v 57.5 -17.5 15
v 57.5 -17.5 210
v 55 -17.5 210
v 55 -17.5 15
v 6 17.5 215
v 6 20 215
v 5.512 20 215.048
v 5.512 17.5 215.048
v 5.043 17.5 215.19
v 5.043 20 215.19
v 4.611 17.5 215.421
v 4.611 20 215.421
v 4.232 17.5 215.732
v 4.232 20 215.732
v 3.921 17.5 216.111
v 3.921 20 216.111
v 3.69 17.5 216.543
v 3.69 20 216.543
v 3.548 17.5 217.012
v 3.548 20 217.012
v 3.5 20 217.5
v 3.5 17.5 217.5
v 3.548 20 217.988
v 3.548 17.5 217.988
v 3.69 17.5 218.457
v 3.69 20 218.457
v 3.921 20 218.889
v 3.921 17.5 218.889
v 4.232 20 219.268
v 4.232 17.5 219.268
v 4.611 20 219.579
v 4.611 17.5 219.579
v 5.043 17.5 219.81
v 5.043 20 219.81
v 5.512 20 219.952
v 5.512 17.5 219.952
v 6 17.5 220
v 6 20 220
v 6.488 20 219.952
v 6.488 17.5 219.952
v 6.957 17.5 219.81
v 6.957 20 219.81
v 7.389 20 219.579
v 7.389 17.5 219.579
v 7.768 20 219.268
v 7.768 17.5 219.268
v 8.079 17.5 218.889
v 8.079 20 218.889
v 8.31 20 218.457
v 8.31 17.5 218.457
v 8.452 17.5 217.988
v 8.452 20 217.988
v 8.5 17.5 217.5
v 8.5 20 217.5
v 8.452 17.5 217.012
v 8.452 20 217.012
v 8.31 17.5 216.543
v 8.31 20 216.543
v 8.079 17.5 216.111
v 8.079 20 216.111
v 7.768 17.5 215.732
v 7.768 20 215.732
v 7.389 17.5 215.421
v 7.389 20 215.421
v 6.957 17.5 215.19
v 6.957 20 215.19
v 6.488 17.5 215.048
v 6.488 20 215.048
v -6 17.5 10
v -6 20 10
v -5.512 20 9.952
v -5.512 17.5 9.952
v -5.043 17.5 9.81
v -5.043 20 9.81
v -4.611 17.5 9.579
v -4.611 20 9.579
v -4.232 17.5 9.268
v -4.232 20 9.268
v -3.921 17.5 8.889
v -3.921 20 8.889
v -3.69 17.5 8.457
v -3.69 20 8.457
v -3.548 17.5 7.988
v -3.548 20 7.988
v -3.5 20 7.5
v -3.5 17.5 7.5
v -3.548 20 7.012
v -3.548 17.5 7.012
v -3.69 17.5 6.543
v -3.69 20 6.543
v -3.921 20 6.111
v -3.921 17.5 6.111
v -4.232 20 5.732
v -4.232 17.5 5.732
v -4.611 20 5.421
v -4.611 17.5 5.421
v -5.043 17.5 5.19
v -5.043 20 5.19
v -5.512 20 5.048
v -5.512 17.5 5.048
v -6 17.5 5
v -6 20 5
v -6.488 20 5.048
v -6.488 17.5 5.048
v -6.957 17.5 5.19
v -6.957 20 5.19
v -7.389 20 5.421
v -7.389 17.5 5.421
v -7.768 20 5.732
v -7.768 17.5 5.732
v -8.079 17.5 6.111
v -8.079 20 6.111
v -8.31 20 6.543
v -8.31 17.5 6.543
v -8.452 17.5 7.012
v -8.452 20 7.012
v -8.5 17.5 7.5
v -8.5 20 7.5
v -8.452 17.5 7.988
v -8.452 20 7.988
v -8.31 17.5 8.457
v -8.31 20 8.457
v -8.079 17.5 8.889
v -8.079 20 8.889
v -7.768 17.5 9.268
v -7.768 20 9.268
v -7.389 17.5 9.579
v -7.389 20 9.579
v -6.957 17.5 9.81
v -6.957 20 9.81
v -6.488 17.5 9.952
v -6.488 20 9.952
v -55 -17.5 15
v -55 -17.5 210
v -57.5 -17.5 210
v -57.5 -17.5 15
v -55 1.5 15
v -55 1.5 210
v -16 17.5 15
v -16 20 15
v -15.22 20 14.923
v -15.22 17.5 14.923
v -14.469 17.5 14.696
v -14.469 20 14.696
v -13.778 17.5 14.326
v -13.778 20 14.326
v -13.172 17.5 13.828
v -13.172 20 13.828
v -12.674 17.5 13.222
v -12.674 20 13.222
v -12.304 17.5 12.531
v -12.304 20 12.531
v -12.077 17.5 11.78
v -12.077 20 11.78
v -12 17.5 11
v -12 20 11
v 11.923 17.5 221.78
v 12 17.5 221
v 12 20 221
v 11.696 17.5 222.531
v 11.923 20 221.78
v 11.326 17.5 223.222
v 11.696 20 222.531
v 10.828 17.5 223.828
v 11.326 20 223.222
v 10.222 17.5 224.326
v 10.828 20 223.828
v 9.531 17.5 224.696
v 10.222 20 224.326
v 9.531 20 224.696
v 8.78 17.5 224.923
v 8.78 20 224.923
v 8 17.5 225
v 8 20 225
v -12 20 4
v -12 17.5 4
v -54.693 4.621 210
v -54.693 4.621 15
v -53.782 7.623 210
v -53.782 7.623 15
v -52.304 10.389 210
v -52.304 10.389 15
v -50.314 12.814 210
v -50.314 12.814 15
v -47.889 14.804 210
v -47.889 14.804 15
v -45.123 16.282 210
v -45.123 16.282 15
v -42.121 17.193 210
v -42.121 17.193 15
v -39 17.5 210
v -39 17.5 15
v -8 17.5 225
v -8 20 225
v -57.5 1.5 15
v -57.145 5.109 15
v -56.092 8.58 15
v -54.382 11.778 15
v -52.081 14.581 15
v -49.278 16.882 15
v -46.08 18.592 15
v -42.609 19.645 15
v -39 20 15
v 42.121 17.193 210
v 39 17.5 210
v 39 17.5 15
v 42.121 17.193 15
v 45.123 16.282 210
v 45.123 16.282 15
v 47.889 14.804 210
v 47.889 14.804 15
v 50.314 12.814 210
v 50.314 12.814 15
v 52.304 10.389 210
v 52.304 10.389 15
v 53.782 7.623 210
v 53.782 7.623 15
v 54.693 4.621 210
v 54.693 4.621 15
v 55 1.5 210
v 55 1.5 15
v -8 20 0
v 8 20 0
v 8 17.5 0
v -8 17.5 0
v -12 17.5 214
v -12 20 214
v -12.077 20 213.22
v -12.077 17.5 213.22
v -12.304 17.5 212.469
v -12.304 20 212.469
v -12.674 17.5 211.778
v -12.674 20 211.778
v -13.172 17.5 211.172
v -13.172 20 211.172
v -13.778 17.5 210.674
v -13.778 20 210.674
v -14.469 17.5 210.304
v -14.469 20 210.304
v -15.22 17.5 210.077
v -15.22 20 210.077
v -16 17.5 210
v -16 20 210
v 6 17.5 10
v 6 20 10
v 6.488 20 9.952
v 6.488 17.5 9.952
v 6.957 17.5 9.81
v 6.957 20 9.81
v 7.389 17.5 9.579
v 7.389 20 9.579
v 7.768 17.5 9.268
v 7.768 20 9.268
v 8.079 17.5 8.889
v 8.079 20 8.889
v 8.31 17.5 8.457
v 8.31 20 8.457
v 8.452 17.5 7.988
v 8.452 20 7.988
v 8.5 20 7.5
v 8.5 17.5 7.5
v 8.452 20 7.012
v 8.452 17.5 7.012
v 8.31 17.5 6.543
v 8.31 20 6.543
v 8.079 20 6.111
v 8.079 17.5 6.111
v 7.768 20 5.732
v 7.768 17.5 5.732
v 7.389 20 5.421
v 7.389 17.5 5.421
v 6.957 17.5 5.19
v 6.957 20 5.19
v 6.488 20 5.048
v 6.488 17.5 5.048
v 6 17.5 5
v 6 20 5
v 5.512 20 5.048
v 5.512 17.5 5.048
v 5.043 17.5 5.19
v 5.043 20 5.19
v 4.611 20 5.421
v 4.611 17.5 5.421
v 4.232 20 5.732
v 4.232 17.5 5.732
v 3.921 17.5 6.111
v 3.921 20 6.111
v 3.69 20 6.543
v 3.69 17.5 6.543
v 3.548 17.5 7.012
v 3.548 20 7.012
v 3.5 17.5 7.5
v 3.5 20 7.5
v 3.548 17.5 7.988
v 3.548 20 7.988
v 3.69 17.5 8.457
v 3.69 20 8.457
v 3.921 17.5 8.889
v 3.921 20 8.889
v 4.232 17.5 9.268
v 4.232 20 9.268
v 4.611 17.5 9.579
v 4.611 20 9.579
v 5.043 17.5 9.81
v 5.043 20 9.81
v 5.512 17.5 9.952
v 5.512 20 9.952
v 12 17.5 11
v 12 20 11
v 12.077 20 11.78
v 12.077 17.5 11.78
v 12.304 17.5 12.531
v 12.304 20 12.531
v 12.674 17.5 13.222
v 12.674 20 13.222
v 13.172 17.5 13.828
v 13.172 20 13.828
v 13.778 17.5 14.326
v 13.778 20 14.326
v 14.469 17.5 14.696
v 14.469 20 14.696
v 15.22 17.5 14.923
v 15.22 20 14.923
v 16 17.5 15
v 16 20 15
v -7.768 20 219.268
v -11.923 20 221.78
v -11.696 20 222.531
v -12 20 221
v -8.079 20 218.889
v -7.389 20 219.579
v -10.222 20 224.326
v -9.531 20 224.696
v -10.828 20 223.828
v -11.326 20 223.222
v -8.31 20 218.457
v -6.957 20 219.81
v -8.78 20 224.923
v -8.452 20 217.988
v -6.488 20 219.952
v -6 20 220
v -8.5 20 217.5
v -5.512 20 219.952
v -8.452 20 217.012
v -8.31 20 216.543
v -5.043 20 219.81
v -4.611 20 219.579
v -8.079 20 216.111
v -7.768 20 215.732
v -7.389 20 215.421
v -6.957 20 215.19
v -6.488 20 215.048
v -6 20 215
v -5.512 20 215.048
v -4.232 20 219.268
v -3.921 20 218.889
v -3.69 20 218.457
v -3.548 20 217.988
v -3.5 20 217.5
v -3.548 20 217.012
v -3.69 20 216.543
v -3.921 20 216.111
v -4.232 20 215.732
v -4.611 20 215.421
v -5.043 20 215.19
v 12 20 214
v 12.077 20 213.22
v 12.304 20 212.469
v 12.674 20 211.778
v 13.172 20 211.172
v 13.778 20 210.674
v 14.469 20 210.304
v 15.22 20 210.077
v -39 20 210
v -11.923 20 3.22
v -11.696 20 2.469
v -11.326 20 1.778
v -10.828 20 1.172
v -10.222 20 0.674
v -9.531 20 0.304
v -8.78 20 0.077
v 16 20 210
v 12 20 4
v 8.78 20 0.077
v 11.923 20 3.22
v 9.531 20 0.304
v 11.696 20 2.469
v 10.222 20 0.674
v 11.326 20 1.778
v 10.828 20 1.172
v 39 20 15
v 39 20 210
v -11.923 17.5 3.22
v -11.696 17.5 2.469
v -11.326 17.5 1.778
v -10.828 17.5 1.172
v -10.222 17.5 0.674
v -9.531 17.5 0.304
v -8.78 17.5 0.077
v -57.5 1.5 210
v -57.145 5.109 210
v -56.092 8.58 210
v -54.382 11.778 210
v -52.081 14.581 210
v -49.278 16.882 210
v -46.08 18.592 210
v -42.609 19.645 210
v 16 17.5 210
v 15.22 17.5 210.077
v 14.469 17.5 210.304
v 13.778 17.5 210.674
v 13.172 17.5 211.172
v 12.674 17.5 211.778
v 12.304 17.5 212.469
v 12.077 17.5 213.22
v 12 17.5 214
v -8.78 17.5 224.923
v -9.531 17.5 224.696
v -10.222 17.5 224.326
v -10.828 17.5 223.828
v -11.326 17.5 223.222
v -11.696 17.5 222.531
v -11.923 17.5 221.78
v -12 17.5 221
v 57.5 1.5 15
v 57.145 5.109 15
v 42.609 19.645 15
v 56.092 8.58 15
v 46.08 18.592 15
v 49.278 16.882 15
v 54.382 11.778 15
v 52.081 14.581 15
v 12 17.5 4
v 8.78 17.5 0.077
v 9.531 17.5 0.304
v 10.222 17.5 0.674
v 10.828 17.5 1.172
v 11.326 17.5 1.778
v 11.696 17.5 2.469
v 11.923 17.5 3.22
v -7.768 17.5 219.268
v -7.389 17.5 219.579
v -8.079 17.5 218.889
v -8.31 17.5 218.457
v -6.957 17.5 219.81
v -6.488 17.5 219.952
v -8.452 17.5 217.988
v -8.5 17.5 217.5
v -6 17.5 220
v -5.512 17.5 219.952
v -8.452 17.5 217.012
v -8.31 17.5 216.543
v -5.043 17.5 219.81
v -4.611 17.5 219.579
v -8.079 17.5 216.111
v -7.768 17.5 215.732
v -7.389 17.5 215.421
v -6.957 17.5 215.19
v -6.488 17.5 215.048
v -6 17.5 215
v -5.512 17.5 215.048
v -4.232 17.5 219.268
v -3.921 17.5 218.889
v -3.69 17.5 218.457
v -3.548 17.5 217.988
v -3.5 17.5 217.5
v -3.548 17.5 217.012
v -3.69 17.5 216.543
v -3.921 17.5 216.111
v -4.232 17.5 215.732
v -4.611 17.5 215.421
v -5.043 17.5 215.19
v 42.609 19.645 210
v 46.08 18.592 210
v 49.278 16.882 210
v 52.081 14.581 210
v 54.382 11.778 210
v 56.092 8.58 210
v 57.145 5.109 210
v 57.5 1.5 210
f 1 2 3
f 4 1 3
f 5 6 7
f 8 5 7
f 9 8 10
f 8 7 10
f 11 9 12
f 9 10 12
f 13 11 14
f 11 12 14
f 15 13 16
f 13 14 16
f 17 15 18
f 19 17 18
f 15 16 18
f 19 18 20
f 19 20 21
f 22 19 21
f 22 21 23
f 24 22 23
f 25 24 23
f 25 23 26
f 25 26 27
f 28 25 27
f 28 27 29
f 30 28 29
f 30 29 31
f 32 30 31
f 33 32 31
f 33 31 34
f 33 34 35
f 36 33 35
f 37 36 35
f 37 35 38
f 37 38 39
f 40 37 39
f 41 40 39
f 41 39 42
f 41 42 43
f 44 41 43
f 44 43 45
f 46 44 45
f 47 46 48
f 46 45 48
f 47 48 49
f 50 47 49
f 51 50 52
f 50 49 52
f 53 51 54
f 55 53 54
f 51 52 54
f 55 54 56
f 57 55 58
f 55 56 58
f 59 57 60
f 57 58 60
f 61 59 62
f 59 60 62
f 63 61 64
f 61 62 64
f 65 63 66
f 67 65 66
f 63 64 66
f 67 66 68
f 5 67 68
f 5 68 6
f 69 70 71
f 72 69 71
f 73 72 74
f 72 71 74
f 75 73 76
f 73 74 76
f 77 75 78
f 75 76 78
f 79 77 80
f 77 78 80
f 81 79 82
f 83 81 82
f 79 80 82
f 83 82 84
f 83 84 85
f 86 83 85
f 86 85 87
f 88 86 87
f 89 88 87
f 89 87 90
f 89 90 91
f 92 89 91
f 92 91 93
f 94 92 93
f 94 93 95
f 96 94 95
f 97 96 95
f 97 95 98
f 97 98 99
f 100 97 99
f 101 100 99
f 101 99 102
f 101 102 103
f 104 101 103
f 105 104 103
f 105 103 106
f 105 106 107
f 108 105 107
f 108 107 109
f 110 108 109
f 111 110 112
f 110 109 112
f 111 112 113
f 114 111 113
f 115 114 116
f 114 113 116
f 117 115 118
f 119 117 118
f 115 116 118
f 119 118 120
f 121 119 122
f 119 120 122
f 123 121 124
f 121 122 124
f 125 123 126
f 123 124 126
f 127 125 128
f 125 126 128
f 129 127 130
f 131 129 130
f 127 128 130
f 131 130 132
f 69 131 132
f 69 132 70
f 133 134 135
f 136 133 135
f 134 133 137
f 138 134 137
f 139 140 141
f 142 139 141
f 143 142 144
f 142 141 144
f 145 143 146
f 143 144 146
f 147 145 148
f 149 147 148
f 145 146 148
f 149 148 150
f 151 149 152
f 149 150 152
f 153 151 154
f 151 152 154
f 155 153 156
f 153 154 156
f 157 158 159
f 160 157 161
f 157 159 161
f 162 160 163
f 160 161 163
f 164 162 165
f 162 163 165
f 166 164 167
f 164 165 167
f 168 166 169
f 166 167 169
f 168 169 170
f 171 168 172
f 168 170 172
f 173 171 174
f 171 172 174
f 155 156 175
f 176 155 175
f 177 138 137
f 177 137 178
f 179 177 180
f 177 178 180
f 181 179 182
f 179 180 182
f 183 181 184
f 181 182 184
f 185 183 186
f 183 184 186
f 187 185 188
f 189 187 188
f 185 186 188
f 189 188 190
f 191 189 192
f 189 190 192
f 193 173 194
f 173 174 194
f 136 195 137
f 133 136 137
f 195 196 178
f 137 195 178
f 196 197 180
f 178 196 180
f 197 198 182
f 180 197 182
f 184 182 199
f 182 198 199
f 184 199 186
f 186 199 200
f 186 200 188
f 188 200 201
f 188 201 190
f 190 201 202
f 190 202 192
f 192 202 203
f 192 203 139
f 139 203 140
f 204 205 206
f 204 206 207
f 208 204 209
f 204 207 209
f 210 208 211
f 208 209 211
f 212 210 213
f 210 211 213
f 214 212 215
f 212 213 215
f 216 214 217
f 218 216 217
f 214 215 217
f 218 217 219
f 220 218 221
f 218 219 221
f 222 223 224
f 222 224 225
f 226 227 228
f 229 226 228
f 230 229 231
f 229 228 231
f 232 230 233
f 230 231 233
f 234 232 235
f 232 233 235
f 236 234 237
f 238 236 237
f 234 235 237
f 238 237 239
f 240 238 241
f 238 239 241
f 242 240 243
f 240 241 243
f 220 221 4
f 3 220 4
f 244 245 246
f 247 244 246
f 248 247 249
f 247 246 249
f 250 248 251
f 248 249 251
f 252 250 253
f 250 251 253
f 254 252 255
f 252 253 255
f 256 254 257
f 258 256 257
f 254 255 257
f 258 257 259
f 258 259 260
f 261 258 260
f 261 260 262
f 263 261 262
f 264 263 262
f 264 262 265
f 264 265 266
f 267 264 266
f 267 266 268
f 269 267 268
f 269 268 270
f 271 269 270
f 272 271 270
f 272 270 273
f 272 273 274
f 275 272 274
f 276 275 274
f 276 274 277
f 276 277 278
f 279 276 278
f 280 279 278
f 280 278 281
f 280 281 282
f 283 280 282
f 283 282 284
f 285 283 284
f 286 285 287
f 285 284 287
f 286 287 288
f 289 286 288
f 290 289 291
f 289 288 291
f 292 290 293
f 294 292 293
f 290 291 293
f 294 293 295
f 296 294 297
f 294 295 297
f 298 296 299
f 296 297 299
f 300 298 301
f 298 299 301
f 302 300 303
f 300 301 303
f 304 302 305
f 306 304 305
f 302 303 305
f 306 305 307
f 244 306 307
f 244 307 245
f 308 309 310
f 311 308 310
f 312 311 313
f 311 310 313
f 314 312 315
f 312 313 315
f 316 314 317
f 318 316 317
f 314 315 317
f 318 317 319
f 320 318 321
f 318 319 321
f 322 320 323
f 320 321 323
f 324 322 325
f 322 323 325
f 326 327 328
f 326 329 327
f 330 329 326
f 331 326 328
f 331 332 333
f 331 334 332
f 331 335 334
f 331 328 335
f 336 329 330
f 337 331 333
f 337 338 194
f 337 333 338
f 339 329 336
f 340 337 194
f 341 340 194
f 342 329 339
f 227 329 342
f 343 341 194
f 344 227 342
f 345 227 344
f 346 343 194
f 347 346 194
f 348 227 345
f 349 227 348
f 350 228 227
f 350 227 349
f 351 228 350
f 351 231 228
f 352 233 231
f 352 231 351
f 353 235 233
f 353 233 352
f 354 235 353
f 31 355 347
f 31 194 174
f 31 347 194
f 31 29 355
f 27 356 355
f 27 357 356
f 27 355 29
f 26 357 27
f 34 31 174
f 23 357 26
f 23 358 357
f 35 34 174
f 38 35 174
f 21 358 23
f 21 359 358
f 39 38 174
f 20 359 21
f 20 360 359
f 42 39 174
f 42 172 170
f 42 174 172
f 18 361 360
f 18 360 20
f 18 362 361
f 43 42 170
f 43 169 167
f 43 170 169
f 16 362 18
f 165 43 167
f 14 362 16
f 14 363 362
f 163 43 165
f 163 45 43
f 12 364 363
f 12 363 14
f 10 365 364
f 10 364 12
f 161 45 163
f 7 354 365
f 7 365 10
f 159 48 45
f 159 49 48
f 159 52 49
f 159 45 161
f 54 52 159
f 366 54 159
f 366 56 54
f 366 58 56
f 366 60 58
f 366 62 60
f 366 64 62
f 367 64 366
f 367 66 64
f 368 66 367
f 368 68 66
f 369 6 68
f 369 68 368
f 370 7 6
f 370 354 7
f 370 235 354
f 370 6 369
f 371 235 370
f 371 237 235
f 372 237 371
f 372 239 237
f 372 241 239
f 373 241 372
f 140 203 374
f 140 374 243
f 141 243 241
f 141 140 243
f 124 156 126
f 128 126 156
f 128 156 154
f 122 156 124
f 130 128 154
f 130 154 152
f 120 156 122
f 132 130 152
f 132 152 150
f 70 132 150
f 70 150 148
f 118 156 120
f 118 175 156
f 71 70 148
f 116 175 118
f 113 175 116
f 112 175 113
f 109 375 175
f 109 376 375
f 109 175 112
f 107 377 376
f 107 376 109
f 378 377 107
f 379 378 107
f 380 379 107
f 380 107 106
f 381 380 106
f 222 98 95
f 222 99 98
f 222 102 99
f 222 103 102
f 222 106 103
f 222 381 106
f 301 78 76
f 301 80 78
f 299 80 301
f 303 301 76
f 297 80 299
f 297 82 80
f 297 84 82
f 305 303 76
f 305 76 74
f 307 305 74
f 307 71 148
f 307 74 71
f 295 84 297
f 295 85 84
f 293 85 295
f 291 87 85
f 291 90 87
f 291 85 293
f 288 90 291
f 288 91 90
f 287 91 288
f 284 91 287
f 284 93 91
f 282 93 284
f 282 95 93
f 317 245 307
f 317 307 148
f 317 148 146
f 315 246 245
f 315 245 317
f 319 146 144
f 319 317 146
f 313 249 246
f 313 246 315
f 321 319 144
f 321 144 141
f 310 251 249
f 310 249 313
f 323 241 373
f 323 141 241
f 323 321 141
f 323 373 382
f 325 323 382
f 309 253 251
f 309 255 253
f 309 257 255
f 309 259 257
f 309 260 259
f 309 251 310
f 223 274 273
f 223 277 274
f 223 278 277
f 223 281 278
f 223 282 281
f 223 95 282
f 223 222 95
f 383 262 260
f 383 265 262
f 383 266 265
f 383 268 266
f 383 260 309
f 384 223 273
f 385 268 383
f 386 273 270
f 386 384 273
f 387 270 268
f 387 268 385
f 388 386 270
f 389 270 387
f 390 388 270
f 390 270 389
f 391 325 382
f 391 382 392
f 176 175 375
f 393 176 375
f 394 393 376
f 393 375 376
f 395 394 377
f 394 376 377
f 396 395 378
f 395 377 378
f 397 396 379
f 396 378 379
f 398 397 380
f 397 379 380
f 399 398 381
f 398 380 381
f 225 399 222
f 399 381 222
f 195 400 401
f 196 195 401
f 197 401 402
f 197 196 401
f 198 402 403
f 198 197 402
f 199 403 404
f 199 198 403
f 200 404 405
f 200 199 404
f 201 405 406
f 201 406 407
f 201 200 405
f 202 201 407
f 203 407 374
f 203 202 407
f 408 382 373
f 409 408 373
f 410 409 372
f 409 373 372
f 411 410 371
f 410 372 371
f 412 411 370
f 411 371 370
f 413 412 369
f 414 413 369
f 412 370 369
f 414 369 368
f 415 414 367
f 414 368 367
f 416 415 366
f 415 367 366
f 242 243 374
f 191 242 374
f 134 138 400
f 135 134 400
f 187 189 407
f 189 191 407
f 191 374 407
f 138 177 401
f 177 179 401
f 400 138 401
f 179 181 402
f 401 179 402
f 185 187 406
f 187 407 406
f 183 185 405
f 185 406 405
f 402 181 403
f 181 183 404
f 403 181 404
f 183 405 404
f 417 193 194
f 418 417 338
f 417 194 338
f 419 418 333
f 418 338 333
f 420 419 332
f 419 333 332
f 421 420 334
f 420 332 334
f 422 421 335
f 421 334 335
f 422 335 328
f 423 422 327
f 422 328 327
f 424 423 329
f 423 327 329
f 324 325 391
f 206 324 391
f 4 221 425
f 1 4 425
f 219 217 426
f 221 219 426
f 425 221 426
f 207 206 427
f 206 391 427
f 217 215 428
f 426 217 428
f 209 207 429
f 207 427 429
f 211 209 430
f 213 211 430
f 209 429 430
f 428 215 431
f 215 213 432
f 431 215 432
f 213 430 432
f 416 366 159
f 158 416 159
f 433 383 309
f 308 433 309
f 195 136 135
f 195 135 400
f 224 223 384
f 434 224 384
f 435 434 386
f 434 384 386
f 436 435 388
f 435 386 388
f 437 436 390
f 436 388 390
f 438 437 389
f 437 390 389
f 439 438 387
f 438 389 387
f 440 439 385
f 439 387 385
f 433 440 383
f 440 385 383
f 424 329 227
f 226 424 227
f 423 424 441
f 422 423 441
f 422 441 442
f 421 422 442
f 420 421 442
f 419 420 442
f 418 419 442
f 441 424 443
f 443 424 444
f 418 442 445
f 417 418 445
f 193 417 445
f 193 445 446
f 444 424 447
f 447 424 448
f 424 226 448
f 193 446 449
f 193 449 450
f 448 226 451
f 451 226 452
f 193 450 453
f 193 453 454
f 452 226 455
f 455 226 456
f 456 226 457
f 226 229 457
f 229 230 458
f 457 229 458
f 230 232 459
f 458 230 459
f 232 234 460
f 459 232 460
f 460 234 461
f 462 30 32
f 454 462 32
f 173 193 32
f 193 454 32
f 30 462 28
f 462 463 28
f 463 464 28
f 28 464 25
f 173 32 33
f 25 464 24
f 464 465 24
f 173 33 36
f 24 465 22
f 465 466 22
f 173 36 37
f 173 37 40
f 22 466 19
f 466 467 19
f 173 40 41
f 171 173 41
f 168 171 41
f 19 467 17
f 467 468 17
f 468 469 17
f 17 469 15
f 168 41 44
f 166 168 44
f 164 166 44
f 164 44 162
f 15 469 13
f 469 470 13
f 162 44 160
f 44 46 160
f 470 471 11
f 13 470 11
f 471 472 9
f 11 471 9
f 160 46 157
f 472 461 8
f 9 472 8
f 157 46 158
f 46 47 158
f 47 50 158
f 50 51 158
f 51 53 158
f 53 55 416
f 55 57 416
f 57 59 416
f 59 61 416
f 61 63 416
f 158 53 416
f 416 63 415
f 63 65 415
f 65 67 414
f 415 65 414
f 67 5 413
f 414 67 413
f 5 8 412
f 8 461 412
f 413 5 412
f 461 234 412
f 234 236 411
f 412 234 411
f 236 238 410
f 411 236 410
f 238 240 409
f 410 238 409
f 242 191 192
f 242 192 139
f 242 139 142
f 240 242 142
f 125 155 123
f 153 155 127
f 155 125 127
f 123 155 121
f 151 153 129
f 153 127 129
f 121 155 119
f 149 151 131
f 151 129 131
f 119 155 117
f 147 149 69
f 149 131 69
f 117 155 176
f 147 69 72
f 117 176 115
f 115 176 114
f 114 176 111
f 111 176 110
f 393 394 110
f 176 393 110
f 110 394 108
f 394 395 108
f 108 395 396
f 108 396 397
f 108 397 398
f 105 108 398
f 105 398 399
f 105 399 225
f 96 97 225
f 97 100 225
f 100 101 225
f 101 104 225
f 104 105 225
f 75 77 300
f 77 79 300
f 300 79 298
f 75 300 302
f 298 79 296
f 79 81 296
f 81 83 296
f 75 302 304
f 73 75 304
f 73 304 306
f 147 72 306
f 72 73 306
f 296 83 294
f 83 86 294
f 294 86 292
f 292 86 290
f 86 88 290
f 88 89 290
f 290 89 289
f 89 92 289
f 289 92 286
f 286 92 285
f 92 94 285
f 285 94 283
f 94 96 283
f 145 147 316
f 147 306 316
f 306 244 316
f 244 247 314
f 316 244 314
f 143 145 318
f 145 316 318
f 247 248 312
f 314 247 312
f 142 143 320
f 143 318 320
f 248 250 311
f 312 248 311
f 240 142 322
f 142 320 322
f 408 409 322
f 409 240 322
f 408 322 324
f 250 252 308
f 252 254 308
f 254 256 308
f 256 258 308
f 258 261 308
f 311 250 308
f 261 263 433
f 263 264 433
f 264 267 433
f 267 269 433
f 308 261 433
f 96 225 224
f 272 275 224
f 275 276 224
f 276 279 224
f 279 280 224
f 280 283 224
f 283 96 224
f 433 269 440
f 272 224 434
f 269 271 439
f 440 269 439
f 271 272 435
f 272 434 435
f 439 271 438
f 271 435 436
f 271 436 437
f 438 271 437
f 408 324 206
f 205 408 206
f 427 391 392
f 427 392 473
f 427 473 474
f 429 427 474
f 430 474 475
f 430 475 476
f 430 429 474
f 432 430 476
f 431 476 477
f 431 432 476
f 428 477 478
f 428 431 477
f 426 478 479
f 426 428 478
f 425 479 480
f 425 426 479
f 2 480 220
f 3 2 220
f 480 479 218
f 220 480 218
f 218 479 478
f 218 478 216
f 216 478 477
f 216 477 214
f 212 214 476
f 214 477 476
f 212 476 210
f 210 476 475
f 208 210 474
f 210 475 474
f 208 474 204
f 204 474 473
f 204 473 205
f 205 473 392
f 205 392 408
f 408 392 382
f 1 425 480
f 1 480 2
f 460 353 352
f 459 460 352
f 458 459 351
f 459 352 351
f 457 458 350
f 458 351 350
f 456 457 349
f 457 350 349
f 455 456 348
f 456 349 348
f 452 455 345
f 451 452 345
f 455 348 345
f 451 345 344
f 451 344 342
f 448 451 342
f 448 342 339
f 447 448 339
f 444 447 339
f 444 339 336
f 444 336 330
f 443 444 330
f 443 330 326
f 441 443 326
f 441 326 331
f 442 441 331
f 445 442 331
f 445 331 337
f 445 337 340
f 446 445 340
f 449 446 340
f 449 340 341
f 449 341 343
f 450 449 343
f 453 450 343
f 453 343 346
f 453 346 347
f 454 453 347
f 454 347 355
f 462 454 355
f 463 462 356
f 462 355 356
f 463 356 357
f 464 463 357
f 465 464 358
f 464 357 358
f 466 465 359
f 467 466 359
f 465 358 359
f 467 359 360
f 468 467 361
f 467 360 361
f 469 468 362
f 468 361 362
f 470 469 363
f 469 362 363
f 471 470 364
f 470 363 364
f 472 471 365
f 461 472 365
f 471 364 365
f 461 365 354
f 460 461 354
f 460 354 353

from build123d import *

# Parameters (mm, degrees)
EXTRUDE_1_DEPTH     = 225
SHELL_2_T           = 2.5
SKETCH_2_R          = 2.5
CUT_EXTRUDE_1_DEPTH = 236.239239924


with BuildPart() as part:
    # 草图1 → 凸台-拉伸1 (new body)
    with BuildSketch(Plane.XY):
        with BuildLine():
            Line((-39, 17.5), (39, 17.5))
            ThreePointArc((39, 17.5), (50.313708499, 12.813708499), (55, 1.5))
            Line((55, 1.5), (55, -17.5))
            Line((55, -17.5), (-55, -17.5))
            Line((-55, -17.5), (-55, 1.5))
            ThreePointArc((-55, 1.5), (-50.313708499, 12.813708499), (-39, 17.5))
        make_face()
    extrude(amount=EXTRUDE_1_DEPTH)

    # 抽壳2
    shell_2_openings = [part.faces().sort_by_distance(p)[0] for p in [
        (0, -17.5, 112.5),
        (0, -0.40911681, 0),
        (0, -0.40911681, 225),
    ]]
    offset(amount=SHELL_2_T, openings=shell_2_openings, kind=Kind.INTERSECTION)

    # 草图2 → 切除-拉伸1 (cut, through all)
    with BuildSketch(Plane(origin=(0, 20, 0), x_dir=(1, 0, 0), z_dir=(0, 1, 0))):
        with Locations(Location((-6, -7.5, 0), (0, 0, 270))):
            Circle(SKETCH_2_R)
        with Locations(Location((6, -7.5, 0), (0, 0, 270))):
            Circle(SKETCH_2_R)
        with Locations(Location((6, -217.5, 0), (0, 0, 90))):
            Circle(SKETCH_2_R)
        with Locations(Location((-6, -217.5, 0), (0, 0, 90))):
            Circle(SKETCH_2_R)
        with BuildLine():
            Line((-8, 0), (-68.033168475, 0))
            Line((-68.033168475, 0), (-68.033168475, -15))
            Line((-68.033168475, -15), (-57.5, -15))
            Line((-57.5, -15), (-16, -15))
            ThreePointArc((-16, -15), (-13.171572875, -13.828427125), (-12, -11))
            Line((-12, -11), (-12, -4))
            ThreePointArc((-12, -4), (-10.828427125, -1.171572875), (-8, 0))
        make_face()
        with BuildLine():
            Line((68.316175474, -15), (68.316175474, 0))
            Line((68.316175474, 0), (8, 0))
            ThreePointArc((8, 0), (10.828427125, -1.171572875), (12, -4))
            Line((12, -4), (12, -11))
            ThreePointArc((12, -11), (13.171572875, -13.828427125), (16, -15))
            Line((16, -15), (68.316175474, -15))
        make_face()
        with BuildLine():
            Line((8, -225), (68.316175474, -225))
            Line((68.316175474, -225), (68.316175474, -210))
            Line((68.316175474, -210), (16, -210))
            ThreePointArc((16, -210), (13.171572875, -211.171572875), (12, -214))
            Line((12, -214), (12, -221))
            ThreePointArc((12, -221), (10.828427125, -223.828427125), (8, -225))
        make_face()
        with BuildLine():
            Line((-16, -210), (-57.5, -210))
            Line((-57.5, -210), (-68.033168475, -210))
            Line((-68.033168475, -210), (-68.033168475, -225))
            Line((-68.033168475, -225), (-8, -225))
            ThreePointArc((-8, -225), (-10.828427125, -223.828427125), (-12, -221))
            Line((-12, -221), (-12, -214))
            ThreePointArc((-12, -214), (-13.171572875, -211.171572875), (-16, -210))
        make_face()
    extrude(amount=-CUT_EXTRUDE_1_DEPTH, mode=Mode.SUBTRACT)


solid = part.part
